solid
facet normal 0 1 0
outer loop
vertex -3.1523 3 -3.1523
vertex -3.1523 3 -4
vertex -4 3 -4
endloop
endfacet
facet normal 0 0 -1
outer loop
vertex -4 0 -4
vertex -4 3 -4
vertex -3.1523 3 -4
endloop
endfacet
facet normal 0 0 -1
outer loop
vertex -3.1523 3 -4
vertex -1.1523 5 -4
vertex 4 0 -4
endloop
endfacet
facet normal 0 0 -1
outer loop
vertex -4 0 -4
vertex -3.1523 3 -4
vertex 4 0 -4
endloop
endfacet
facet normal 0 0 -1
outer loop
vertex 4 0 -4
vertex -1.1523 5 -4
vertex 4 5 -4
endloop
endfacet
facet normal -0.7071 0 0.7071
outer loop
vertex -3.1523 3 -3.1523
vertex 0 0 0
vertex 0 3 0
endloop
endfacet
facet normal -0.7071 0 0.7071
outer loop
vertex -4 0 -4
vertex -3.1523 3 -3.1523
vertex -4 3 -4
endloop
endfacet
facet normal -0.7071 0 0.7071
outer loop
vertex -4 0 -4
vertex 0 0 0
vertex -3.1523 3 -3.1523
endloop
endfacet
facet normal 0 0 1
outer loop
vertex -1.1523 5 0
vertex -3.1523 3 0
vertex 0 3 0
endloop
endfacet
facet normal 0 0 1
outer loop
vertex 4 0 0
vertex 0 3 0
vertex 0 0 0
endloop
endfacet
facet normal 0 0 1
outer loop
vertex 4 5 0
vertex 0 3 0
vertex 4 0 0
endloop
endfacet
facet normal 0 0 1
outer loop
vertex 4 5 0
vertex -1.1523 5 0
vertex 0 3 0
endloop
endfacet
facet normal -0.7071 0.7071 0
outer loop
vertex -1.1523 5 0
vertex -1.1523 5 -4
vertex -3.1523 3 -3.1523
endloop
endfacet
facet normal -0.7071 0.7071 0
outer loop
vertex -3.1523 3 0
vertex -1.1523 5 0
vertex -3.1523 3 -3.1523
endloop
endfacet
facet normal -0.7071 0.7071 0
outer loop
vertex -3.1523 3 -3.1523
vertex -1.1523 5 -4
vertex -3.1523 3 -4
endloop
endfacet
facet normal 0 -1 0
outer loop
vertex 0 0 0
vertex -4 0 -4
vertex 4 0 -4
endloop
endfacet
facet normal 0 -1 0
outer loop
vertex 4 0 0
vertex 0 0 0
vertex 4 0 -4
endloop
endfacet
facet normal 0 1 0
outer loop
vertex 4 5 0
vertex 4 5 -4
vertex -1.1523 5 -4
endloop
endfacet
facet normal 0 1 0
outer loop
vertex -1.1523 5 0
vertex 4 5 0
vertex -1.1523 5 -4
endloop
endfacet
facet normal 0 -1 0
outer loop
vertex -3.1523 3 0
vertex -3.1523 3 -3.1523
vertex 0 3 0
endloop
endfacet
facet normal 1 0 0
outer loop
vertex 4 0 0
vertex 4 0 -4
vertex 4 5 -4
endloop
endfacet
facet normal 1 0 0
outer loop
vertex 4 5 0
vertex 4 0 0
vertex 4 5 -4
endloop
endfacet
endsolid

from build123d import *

# Parameters (mm, degrees)
BOSS_EXTRUDE1_DEPTH = 3
BOSS_EXTRUDE2_DEPTH = 4


with BuildPart() as part:
    # Sketch1 → Boss-Extrude1 (new body)
    with BuildSketch(Plane(origin=(0, 0, 0), x_dir=(1, 0, 0), z_dir=(0, 1, 0))):
        Polygon((0, 0), (-4, 4), (0, 4), align=None)
    extrude(amount=BOSS_EXTRUDE1_DEPTH)

    # Sketch2 → Boss-Extrude2 (add)
    with BuildSketch(Plane(origin=(0, 0, -4), x_dir=(-1, 0, 0), z_dir=(0, 0, -1))):
        Polygon((1.152291055, 5), (3.152291055, 3), (0, 3), (0, 0), (-4, 0), (-4, 5), align=None)
    extrude(amount=-BOSS_EXTRUDE2_DEPTH)


solid = part.part
